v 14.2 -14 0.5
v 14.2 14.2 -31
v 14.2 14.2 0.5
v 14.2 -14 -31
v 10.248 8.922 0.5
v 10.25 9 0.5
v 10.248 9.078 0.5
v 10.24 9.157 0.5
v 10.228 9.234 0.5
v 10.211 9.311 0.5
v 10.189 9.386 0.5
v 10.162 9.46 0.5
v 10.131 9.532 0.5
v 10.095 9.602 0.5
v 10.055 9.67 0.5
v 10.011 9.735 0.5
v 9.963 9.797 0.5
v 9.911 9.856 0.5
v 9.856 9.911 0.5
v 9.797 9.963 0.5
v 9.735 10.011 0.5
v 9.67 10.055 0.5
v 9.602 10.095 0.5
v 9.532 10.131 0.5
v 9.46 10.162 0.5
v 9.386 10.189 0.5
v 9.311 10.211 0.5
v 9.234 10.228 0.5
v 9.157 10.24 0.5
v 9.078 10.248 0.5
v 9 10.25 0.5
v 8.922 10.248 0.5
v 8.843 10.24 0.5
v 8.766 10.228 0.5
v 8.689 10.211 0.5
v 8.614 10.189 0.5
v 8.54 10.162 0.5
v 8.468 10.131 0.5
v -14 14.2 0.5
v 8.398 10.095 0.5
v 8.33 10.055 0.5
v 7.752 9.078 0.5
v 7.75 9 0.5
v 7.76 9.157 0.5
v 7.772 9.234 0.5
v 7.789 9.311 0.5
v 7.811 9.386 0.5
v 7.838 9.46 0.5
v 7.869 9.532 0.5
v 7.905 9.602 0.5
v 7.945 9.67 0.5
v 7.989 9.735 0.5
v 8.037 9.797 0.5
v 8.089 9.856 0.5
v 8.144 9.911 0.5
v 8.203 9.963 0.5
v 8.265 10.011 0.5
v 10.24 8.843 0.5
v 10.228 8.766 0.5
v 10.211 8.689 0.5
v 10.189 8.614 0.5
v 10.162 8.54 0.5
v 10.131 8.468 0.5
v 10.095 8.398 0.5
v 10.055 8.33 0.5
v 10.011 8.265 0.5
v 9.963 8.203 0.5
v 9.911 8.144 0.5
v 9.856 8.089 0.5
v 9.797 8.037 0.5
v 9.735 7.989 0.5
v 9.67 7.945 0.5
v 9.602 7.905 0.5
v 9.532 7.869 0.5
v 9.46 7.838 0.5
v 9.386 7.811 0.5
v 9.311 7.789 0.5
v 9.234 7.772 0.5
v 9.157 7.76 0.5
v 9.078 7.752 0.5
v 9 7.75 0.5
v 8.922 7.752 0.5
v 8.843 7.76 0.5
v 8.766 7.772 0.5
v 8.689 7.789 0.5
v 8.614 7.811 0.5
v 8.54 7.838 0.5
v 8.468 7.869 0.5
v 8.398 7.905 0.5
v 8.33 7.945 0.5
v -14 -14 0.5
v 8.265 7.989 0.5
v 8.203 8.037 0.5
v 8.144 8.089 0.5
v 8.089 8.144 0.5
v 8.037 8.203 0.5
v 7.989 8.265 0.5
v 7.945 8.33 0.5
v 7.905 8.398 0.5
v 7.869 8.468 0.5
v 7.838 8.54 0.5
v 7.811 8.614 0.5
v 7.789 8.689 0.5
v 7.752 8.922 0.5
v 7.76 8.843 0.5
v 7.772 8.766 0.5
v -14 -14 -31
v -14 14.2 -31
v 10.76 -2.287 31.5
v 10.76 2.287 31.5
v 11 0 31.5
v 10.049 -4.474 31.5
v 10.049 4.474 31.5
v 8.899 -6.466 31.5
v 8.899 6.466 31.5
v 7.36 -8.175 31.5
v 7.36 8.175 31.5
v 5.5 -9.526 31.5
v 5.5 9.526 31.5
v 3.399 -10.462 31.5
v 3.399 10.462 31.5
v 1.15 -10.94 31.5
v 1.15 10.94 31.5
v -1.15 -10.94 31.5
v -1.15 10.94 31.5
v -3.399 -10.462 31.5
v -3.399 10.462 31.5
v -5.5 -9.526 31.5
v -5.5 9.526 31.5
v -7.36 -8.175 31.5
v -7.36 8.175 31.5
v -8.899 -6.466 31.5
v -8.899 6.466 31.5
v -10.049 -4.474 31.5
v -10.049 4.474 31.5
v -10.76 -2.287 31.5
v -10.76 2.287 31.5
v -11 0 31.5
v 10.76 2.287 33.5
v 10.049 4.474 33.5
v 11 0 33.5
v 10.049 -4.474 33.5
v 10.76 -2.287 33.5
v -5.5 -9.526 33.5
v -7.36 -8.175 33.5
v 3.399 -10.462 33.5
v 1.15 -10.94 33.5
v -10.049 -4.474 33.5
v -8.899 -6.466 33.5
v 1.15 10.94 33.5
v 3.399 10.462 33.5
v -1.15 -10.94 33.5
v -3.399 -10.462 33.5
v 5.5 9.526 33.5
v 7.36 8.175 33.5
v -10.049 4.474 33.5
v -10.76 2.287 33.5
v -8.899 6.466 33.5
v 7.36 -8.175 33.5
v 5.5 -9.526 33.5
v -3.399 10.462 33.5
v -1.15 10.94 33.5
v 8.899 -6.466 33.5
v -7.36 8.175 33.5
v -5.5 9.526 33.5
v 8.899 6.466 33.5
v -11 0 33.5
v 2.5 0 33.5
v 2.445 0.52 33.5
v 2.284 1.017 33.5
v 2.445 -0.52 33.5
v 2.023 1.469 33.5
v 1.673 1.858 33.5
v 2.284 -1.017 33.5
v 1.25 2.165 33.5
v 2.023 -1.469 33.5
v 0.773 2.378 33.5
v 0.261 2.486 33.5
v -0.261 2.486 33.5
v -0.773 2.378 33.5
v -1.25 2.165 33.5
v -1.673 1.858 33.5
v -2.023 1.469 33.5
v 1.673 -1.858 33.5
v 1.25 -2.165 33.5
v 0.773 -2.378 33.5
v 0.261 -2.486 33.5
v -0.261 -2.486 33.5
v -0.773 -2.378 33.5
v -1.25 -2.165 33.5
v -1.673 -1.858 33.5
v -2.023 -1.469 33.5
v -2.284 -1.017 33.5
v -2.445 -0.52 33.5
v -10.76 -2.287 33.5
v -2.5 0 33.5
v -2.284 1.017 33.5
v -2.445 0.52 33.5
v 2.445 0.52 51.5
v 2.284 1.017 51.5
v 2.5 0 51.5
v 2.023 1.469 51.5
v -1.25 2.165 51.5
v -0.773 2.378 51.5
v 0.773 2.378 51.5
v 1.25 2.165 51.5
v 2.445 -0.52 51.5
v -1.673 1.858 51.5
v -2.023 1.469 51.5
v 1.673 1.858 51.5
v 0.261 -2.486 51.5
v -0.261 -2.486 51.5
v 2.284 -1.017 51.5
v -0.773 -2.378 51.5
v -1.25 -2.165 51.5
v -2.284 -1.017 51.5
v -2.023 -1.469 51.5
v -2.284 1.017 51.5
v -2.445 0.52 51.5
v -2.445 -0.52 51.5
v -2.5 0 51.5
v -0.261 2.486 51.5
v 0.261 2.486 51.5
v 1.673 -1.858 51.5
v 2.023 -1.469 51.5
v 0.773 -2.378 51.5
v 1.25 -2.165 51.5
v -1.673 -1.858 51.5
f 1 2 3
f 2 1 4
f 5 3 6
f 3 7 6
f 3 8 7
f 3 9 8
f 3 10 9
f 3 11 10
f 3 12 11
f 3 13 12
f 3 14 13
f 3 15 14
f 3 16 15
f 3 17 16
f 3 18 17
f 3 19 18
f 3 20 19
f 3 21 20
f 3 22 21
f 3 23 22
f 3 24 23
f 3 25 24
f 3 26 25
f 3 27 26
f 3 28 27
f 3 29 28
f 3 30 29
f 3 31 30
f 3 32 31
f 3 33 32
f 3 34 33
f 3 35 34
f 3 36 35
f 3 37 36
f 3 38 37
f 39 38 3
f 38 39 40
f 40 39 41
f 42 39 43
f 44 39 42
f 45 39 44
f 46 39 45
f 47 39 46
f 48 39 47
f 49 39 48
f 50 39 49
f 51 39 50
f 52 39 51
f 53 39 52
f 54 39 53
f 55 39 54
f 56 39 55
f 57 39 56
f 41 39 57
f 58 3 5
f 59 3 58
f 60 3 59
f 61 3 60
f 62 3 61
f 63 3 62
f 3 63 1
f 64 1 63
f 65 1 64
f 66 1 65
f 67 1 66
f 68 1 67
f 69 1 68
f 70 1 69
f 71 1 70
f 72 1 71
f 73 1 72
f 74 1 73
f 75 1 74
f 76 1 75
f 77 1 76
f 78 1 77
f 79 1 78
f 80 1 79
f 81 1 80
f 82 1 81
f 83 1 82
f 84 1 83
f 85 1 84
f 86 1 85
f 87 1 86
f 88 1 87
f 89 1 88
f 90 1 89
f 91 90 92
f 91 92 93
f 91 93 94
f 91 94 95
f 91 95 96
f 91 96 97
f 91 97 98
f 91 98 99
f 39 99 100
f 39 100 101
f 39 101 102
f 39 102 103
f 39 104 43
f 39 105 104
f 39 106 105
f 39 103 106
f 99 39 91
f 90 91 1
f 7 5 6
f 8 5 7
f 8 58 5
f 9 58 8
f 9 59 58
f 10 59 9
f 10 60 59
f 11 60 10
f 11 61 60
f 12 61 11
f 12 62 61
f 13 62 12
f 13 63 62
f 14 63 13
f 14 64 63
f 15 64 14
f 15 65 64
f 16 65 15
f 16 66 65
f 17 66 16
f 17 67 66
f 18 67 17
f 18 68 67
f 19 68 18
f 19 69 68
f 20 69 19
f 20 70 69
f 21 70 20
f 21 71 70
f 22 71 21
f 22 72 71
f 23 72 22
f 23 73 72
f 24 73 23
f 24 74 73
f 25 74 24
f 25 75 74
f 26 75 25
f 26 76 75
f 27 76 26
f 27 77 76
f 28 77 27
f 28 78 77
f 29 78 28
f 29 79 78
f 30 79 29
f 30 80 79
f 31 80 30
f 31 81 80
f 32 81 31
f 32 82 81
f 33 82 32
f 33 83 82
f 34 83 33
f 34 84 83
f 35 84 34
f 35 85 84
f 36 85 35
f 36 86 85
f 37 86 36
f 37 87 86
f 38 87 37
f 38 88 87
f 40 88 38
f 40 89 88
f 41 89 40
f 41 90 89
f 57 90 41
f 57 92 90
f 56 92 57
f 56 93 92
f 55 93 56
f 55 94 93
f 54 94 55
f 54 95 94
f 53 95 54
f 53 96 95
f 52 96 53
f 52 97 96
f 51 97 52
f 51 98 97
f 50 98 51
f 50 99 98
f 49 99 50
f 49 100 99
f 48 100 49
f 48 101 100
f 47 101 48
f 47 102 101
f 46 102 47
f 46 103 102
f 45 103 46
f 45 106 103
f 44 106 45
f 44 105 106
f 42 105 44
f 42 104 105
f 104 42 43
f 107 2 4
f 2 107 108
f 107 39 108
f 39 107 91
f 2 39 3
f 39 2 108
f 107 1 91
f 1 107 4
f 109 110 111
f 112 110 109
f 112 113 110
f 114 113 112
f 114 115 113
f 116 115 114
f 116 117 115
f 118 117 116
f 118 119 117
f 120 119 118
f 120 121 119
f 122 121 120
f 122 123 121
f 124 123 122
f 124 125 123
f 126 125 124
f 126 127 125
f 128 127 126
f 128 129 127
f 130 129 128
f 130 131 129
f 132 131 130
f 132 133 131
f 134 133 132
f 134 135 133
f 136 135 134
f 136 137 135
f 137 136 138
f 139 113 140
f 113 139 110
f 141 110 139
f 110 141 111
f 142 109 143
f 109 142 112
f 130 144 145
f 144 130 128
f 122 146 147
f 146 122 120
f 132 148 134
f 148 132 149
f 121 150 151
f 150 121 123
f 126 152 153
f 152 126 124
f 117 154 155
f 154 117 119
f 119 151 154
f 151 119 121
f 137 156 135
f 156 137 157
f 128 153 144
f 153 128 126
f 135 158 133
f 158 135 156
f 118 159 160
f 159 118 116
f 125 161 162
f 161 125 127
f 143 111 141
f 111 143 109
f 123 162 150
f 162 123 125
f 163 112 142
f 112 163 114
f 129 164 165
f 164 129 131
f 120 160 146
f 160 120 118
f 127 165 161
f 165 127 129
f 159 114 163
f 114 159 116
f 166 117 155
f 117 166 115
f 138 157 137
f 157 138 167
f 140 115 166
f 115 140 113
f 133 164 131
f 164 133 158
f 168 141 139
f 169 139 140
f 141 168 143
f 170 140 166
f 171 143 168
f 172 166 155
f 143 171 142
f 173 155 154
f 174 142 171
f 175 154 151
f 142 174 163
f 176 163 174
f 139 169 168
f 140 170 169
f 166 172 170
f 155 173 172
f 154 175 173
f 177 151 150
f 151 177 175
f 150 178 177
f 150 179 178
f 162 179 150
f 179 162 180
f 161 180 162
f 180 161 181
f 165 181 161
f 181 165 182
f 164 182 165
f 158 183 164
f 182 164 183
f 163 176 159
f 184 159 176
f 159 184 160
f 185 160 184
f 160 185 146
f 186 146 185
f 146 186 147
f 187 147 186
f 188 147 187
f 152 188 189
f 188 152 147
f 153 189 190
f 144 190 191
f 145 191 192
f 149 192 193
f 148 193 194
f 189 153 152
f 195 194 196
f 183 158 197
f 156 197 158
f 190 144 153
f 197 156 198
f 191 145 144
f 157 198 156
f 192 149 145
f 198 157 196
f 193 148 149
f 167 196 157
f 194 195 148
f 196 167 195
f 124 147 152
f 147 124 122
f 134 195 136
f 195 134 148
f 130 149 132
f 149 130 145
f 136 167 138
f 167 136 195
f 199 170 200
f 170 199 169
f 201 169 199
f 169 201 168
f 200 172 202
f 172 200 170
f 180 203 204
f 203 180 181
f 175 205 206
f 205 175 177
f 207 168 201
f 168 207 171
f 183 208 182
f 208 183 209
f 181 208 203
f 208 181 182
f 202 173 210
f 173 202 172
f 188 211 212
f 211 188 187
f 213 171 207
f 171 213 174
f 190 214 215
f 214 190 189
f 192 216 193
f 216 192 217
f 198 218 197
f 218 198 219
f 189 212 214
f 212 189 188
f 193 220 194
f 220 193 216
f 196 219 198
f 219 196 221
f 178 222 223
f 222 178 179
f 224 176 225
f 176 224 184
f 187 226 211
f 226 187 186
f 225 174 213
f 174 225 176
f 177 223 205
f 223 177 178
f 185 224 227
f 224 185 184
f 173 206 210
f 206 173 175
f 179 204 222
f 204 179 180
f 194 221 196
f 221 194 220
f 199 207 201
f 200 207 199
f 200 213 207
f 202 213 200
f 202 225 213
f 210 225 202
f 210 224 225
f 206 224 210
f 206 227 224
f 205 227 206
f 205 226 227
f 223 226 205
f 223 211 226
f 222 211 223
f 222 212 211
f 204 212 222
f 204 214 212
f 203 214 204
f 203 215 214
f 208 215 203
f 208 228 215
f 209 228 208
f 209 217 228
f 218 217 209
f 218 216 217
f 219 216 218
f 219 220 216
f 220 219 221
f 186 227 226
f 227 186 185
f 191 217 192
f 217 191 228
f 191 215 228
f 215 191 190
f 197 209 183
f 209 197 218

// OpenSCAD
//union(){
//difference() {
//	color("gray")cube([28.2, 28.2, 31.5]);
//	translate([20, 10, 30])rotate ([180,0,0]) cylinder (h = 4, r=0.9, center = true, $fn=100);
//}
//translate([50, 50, 50])cube([10, 10, 10]);
//}

//------------------------------------------------
module nema11()
{
  
    union()
    {
       


        translate([-14, -14, -31])
     difference(){
        color("gray")cube([28.2, 28.2, 31.5]);
	translate([23, 23, 33.5])rotate ([180,0,0]) cylinder (h = 4, r=1.25, center = true, $fn=100);
     
         translate([33.5, 23, 23])rotate ([180,0,0]) cylinder (h = 4, r=1.25, center = true, $fn=100);
 }
 
        translate([0, 0, 31.5])
        cylinder(r=2,h=1);

        translate([0, 0, 31.5])
        color("yellow")cylinder (h=2, r=11, $fn=30);
        translate([0, 0, 31.5])
         cylinder(h=20, r=2.5, $fn=30);
        
    }
}
nema11();
